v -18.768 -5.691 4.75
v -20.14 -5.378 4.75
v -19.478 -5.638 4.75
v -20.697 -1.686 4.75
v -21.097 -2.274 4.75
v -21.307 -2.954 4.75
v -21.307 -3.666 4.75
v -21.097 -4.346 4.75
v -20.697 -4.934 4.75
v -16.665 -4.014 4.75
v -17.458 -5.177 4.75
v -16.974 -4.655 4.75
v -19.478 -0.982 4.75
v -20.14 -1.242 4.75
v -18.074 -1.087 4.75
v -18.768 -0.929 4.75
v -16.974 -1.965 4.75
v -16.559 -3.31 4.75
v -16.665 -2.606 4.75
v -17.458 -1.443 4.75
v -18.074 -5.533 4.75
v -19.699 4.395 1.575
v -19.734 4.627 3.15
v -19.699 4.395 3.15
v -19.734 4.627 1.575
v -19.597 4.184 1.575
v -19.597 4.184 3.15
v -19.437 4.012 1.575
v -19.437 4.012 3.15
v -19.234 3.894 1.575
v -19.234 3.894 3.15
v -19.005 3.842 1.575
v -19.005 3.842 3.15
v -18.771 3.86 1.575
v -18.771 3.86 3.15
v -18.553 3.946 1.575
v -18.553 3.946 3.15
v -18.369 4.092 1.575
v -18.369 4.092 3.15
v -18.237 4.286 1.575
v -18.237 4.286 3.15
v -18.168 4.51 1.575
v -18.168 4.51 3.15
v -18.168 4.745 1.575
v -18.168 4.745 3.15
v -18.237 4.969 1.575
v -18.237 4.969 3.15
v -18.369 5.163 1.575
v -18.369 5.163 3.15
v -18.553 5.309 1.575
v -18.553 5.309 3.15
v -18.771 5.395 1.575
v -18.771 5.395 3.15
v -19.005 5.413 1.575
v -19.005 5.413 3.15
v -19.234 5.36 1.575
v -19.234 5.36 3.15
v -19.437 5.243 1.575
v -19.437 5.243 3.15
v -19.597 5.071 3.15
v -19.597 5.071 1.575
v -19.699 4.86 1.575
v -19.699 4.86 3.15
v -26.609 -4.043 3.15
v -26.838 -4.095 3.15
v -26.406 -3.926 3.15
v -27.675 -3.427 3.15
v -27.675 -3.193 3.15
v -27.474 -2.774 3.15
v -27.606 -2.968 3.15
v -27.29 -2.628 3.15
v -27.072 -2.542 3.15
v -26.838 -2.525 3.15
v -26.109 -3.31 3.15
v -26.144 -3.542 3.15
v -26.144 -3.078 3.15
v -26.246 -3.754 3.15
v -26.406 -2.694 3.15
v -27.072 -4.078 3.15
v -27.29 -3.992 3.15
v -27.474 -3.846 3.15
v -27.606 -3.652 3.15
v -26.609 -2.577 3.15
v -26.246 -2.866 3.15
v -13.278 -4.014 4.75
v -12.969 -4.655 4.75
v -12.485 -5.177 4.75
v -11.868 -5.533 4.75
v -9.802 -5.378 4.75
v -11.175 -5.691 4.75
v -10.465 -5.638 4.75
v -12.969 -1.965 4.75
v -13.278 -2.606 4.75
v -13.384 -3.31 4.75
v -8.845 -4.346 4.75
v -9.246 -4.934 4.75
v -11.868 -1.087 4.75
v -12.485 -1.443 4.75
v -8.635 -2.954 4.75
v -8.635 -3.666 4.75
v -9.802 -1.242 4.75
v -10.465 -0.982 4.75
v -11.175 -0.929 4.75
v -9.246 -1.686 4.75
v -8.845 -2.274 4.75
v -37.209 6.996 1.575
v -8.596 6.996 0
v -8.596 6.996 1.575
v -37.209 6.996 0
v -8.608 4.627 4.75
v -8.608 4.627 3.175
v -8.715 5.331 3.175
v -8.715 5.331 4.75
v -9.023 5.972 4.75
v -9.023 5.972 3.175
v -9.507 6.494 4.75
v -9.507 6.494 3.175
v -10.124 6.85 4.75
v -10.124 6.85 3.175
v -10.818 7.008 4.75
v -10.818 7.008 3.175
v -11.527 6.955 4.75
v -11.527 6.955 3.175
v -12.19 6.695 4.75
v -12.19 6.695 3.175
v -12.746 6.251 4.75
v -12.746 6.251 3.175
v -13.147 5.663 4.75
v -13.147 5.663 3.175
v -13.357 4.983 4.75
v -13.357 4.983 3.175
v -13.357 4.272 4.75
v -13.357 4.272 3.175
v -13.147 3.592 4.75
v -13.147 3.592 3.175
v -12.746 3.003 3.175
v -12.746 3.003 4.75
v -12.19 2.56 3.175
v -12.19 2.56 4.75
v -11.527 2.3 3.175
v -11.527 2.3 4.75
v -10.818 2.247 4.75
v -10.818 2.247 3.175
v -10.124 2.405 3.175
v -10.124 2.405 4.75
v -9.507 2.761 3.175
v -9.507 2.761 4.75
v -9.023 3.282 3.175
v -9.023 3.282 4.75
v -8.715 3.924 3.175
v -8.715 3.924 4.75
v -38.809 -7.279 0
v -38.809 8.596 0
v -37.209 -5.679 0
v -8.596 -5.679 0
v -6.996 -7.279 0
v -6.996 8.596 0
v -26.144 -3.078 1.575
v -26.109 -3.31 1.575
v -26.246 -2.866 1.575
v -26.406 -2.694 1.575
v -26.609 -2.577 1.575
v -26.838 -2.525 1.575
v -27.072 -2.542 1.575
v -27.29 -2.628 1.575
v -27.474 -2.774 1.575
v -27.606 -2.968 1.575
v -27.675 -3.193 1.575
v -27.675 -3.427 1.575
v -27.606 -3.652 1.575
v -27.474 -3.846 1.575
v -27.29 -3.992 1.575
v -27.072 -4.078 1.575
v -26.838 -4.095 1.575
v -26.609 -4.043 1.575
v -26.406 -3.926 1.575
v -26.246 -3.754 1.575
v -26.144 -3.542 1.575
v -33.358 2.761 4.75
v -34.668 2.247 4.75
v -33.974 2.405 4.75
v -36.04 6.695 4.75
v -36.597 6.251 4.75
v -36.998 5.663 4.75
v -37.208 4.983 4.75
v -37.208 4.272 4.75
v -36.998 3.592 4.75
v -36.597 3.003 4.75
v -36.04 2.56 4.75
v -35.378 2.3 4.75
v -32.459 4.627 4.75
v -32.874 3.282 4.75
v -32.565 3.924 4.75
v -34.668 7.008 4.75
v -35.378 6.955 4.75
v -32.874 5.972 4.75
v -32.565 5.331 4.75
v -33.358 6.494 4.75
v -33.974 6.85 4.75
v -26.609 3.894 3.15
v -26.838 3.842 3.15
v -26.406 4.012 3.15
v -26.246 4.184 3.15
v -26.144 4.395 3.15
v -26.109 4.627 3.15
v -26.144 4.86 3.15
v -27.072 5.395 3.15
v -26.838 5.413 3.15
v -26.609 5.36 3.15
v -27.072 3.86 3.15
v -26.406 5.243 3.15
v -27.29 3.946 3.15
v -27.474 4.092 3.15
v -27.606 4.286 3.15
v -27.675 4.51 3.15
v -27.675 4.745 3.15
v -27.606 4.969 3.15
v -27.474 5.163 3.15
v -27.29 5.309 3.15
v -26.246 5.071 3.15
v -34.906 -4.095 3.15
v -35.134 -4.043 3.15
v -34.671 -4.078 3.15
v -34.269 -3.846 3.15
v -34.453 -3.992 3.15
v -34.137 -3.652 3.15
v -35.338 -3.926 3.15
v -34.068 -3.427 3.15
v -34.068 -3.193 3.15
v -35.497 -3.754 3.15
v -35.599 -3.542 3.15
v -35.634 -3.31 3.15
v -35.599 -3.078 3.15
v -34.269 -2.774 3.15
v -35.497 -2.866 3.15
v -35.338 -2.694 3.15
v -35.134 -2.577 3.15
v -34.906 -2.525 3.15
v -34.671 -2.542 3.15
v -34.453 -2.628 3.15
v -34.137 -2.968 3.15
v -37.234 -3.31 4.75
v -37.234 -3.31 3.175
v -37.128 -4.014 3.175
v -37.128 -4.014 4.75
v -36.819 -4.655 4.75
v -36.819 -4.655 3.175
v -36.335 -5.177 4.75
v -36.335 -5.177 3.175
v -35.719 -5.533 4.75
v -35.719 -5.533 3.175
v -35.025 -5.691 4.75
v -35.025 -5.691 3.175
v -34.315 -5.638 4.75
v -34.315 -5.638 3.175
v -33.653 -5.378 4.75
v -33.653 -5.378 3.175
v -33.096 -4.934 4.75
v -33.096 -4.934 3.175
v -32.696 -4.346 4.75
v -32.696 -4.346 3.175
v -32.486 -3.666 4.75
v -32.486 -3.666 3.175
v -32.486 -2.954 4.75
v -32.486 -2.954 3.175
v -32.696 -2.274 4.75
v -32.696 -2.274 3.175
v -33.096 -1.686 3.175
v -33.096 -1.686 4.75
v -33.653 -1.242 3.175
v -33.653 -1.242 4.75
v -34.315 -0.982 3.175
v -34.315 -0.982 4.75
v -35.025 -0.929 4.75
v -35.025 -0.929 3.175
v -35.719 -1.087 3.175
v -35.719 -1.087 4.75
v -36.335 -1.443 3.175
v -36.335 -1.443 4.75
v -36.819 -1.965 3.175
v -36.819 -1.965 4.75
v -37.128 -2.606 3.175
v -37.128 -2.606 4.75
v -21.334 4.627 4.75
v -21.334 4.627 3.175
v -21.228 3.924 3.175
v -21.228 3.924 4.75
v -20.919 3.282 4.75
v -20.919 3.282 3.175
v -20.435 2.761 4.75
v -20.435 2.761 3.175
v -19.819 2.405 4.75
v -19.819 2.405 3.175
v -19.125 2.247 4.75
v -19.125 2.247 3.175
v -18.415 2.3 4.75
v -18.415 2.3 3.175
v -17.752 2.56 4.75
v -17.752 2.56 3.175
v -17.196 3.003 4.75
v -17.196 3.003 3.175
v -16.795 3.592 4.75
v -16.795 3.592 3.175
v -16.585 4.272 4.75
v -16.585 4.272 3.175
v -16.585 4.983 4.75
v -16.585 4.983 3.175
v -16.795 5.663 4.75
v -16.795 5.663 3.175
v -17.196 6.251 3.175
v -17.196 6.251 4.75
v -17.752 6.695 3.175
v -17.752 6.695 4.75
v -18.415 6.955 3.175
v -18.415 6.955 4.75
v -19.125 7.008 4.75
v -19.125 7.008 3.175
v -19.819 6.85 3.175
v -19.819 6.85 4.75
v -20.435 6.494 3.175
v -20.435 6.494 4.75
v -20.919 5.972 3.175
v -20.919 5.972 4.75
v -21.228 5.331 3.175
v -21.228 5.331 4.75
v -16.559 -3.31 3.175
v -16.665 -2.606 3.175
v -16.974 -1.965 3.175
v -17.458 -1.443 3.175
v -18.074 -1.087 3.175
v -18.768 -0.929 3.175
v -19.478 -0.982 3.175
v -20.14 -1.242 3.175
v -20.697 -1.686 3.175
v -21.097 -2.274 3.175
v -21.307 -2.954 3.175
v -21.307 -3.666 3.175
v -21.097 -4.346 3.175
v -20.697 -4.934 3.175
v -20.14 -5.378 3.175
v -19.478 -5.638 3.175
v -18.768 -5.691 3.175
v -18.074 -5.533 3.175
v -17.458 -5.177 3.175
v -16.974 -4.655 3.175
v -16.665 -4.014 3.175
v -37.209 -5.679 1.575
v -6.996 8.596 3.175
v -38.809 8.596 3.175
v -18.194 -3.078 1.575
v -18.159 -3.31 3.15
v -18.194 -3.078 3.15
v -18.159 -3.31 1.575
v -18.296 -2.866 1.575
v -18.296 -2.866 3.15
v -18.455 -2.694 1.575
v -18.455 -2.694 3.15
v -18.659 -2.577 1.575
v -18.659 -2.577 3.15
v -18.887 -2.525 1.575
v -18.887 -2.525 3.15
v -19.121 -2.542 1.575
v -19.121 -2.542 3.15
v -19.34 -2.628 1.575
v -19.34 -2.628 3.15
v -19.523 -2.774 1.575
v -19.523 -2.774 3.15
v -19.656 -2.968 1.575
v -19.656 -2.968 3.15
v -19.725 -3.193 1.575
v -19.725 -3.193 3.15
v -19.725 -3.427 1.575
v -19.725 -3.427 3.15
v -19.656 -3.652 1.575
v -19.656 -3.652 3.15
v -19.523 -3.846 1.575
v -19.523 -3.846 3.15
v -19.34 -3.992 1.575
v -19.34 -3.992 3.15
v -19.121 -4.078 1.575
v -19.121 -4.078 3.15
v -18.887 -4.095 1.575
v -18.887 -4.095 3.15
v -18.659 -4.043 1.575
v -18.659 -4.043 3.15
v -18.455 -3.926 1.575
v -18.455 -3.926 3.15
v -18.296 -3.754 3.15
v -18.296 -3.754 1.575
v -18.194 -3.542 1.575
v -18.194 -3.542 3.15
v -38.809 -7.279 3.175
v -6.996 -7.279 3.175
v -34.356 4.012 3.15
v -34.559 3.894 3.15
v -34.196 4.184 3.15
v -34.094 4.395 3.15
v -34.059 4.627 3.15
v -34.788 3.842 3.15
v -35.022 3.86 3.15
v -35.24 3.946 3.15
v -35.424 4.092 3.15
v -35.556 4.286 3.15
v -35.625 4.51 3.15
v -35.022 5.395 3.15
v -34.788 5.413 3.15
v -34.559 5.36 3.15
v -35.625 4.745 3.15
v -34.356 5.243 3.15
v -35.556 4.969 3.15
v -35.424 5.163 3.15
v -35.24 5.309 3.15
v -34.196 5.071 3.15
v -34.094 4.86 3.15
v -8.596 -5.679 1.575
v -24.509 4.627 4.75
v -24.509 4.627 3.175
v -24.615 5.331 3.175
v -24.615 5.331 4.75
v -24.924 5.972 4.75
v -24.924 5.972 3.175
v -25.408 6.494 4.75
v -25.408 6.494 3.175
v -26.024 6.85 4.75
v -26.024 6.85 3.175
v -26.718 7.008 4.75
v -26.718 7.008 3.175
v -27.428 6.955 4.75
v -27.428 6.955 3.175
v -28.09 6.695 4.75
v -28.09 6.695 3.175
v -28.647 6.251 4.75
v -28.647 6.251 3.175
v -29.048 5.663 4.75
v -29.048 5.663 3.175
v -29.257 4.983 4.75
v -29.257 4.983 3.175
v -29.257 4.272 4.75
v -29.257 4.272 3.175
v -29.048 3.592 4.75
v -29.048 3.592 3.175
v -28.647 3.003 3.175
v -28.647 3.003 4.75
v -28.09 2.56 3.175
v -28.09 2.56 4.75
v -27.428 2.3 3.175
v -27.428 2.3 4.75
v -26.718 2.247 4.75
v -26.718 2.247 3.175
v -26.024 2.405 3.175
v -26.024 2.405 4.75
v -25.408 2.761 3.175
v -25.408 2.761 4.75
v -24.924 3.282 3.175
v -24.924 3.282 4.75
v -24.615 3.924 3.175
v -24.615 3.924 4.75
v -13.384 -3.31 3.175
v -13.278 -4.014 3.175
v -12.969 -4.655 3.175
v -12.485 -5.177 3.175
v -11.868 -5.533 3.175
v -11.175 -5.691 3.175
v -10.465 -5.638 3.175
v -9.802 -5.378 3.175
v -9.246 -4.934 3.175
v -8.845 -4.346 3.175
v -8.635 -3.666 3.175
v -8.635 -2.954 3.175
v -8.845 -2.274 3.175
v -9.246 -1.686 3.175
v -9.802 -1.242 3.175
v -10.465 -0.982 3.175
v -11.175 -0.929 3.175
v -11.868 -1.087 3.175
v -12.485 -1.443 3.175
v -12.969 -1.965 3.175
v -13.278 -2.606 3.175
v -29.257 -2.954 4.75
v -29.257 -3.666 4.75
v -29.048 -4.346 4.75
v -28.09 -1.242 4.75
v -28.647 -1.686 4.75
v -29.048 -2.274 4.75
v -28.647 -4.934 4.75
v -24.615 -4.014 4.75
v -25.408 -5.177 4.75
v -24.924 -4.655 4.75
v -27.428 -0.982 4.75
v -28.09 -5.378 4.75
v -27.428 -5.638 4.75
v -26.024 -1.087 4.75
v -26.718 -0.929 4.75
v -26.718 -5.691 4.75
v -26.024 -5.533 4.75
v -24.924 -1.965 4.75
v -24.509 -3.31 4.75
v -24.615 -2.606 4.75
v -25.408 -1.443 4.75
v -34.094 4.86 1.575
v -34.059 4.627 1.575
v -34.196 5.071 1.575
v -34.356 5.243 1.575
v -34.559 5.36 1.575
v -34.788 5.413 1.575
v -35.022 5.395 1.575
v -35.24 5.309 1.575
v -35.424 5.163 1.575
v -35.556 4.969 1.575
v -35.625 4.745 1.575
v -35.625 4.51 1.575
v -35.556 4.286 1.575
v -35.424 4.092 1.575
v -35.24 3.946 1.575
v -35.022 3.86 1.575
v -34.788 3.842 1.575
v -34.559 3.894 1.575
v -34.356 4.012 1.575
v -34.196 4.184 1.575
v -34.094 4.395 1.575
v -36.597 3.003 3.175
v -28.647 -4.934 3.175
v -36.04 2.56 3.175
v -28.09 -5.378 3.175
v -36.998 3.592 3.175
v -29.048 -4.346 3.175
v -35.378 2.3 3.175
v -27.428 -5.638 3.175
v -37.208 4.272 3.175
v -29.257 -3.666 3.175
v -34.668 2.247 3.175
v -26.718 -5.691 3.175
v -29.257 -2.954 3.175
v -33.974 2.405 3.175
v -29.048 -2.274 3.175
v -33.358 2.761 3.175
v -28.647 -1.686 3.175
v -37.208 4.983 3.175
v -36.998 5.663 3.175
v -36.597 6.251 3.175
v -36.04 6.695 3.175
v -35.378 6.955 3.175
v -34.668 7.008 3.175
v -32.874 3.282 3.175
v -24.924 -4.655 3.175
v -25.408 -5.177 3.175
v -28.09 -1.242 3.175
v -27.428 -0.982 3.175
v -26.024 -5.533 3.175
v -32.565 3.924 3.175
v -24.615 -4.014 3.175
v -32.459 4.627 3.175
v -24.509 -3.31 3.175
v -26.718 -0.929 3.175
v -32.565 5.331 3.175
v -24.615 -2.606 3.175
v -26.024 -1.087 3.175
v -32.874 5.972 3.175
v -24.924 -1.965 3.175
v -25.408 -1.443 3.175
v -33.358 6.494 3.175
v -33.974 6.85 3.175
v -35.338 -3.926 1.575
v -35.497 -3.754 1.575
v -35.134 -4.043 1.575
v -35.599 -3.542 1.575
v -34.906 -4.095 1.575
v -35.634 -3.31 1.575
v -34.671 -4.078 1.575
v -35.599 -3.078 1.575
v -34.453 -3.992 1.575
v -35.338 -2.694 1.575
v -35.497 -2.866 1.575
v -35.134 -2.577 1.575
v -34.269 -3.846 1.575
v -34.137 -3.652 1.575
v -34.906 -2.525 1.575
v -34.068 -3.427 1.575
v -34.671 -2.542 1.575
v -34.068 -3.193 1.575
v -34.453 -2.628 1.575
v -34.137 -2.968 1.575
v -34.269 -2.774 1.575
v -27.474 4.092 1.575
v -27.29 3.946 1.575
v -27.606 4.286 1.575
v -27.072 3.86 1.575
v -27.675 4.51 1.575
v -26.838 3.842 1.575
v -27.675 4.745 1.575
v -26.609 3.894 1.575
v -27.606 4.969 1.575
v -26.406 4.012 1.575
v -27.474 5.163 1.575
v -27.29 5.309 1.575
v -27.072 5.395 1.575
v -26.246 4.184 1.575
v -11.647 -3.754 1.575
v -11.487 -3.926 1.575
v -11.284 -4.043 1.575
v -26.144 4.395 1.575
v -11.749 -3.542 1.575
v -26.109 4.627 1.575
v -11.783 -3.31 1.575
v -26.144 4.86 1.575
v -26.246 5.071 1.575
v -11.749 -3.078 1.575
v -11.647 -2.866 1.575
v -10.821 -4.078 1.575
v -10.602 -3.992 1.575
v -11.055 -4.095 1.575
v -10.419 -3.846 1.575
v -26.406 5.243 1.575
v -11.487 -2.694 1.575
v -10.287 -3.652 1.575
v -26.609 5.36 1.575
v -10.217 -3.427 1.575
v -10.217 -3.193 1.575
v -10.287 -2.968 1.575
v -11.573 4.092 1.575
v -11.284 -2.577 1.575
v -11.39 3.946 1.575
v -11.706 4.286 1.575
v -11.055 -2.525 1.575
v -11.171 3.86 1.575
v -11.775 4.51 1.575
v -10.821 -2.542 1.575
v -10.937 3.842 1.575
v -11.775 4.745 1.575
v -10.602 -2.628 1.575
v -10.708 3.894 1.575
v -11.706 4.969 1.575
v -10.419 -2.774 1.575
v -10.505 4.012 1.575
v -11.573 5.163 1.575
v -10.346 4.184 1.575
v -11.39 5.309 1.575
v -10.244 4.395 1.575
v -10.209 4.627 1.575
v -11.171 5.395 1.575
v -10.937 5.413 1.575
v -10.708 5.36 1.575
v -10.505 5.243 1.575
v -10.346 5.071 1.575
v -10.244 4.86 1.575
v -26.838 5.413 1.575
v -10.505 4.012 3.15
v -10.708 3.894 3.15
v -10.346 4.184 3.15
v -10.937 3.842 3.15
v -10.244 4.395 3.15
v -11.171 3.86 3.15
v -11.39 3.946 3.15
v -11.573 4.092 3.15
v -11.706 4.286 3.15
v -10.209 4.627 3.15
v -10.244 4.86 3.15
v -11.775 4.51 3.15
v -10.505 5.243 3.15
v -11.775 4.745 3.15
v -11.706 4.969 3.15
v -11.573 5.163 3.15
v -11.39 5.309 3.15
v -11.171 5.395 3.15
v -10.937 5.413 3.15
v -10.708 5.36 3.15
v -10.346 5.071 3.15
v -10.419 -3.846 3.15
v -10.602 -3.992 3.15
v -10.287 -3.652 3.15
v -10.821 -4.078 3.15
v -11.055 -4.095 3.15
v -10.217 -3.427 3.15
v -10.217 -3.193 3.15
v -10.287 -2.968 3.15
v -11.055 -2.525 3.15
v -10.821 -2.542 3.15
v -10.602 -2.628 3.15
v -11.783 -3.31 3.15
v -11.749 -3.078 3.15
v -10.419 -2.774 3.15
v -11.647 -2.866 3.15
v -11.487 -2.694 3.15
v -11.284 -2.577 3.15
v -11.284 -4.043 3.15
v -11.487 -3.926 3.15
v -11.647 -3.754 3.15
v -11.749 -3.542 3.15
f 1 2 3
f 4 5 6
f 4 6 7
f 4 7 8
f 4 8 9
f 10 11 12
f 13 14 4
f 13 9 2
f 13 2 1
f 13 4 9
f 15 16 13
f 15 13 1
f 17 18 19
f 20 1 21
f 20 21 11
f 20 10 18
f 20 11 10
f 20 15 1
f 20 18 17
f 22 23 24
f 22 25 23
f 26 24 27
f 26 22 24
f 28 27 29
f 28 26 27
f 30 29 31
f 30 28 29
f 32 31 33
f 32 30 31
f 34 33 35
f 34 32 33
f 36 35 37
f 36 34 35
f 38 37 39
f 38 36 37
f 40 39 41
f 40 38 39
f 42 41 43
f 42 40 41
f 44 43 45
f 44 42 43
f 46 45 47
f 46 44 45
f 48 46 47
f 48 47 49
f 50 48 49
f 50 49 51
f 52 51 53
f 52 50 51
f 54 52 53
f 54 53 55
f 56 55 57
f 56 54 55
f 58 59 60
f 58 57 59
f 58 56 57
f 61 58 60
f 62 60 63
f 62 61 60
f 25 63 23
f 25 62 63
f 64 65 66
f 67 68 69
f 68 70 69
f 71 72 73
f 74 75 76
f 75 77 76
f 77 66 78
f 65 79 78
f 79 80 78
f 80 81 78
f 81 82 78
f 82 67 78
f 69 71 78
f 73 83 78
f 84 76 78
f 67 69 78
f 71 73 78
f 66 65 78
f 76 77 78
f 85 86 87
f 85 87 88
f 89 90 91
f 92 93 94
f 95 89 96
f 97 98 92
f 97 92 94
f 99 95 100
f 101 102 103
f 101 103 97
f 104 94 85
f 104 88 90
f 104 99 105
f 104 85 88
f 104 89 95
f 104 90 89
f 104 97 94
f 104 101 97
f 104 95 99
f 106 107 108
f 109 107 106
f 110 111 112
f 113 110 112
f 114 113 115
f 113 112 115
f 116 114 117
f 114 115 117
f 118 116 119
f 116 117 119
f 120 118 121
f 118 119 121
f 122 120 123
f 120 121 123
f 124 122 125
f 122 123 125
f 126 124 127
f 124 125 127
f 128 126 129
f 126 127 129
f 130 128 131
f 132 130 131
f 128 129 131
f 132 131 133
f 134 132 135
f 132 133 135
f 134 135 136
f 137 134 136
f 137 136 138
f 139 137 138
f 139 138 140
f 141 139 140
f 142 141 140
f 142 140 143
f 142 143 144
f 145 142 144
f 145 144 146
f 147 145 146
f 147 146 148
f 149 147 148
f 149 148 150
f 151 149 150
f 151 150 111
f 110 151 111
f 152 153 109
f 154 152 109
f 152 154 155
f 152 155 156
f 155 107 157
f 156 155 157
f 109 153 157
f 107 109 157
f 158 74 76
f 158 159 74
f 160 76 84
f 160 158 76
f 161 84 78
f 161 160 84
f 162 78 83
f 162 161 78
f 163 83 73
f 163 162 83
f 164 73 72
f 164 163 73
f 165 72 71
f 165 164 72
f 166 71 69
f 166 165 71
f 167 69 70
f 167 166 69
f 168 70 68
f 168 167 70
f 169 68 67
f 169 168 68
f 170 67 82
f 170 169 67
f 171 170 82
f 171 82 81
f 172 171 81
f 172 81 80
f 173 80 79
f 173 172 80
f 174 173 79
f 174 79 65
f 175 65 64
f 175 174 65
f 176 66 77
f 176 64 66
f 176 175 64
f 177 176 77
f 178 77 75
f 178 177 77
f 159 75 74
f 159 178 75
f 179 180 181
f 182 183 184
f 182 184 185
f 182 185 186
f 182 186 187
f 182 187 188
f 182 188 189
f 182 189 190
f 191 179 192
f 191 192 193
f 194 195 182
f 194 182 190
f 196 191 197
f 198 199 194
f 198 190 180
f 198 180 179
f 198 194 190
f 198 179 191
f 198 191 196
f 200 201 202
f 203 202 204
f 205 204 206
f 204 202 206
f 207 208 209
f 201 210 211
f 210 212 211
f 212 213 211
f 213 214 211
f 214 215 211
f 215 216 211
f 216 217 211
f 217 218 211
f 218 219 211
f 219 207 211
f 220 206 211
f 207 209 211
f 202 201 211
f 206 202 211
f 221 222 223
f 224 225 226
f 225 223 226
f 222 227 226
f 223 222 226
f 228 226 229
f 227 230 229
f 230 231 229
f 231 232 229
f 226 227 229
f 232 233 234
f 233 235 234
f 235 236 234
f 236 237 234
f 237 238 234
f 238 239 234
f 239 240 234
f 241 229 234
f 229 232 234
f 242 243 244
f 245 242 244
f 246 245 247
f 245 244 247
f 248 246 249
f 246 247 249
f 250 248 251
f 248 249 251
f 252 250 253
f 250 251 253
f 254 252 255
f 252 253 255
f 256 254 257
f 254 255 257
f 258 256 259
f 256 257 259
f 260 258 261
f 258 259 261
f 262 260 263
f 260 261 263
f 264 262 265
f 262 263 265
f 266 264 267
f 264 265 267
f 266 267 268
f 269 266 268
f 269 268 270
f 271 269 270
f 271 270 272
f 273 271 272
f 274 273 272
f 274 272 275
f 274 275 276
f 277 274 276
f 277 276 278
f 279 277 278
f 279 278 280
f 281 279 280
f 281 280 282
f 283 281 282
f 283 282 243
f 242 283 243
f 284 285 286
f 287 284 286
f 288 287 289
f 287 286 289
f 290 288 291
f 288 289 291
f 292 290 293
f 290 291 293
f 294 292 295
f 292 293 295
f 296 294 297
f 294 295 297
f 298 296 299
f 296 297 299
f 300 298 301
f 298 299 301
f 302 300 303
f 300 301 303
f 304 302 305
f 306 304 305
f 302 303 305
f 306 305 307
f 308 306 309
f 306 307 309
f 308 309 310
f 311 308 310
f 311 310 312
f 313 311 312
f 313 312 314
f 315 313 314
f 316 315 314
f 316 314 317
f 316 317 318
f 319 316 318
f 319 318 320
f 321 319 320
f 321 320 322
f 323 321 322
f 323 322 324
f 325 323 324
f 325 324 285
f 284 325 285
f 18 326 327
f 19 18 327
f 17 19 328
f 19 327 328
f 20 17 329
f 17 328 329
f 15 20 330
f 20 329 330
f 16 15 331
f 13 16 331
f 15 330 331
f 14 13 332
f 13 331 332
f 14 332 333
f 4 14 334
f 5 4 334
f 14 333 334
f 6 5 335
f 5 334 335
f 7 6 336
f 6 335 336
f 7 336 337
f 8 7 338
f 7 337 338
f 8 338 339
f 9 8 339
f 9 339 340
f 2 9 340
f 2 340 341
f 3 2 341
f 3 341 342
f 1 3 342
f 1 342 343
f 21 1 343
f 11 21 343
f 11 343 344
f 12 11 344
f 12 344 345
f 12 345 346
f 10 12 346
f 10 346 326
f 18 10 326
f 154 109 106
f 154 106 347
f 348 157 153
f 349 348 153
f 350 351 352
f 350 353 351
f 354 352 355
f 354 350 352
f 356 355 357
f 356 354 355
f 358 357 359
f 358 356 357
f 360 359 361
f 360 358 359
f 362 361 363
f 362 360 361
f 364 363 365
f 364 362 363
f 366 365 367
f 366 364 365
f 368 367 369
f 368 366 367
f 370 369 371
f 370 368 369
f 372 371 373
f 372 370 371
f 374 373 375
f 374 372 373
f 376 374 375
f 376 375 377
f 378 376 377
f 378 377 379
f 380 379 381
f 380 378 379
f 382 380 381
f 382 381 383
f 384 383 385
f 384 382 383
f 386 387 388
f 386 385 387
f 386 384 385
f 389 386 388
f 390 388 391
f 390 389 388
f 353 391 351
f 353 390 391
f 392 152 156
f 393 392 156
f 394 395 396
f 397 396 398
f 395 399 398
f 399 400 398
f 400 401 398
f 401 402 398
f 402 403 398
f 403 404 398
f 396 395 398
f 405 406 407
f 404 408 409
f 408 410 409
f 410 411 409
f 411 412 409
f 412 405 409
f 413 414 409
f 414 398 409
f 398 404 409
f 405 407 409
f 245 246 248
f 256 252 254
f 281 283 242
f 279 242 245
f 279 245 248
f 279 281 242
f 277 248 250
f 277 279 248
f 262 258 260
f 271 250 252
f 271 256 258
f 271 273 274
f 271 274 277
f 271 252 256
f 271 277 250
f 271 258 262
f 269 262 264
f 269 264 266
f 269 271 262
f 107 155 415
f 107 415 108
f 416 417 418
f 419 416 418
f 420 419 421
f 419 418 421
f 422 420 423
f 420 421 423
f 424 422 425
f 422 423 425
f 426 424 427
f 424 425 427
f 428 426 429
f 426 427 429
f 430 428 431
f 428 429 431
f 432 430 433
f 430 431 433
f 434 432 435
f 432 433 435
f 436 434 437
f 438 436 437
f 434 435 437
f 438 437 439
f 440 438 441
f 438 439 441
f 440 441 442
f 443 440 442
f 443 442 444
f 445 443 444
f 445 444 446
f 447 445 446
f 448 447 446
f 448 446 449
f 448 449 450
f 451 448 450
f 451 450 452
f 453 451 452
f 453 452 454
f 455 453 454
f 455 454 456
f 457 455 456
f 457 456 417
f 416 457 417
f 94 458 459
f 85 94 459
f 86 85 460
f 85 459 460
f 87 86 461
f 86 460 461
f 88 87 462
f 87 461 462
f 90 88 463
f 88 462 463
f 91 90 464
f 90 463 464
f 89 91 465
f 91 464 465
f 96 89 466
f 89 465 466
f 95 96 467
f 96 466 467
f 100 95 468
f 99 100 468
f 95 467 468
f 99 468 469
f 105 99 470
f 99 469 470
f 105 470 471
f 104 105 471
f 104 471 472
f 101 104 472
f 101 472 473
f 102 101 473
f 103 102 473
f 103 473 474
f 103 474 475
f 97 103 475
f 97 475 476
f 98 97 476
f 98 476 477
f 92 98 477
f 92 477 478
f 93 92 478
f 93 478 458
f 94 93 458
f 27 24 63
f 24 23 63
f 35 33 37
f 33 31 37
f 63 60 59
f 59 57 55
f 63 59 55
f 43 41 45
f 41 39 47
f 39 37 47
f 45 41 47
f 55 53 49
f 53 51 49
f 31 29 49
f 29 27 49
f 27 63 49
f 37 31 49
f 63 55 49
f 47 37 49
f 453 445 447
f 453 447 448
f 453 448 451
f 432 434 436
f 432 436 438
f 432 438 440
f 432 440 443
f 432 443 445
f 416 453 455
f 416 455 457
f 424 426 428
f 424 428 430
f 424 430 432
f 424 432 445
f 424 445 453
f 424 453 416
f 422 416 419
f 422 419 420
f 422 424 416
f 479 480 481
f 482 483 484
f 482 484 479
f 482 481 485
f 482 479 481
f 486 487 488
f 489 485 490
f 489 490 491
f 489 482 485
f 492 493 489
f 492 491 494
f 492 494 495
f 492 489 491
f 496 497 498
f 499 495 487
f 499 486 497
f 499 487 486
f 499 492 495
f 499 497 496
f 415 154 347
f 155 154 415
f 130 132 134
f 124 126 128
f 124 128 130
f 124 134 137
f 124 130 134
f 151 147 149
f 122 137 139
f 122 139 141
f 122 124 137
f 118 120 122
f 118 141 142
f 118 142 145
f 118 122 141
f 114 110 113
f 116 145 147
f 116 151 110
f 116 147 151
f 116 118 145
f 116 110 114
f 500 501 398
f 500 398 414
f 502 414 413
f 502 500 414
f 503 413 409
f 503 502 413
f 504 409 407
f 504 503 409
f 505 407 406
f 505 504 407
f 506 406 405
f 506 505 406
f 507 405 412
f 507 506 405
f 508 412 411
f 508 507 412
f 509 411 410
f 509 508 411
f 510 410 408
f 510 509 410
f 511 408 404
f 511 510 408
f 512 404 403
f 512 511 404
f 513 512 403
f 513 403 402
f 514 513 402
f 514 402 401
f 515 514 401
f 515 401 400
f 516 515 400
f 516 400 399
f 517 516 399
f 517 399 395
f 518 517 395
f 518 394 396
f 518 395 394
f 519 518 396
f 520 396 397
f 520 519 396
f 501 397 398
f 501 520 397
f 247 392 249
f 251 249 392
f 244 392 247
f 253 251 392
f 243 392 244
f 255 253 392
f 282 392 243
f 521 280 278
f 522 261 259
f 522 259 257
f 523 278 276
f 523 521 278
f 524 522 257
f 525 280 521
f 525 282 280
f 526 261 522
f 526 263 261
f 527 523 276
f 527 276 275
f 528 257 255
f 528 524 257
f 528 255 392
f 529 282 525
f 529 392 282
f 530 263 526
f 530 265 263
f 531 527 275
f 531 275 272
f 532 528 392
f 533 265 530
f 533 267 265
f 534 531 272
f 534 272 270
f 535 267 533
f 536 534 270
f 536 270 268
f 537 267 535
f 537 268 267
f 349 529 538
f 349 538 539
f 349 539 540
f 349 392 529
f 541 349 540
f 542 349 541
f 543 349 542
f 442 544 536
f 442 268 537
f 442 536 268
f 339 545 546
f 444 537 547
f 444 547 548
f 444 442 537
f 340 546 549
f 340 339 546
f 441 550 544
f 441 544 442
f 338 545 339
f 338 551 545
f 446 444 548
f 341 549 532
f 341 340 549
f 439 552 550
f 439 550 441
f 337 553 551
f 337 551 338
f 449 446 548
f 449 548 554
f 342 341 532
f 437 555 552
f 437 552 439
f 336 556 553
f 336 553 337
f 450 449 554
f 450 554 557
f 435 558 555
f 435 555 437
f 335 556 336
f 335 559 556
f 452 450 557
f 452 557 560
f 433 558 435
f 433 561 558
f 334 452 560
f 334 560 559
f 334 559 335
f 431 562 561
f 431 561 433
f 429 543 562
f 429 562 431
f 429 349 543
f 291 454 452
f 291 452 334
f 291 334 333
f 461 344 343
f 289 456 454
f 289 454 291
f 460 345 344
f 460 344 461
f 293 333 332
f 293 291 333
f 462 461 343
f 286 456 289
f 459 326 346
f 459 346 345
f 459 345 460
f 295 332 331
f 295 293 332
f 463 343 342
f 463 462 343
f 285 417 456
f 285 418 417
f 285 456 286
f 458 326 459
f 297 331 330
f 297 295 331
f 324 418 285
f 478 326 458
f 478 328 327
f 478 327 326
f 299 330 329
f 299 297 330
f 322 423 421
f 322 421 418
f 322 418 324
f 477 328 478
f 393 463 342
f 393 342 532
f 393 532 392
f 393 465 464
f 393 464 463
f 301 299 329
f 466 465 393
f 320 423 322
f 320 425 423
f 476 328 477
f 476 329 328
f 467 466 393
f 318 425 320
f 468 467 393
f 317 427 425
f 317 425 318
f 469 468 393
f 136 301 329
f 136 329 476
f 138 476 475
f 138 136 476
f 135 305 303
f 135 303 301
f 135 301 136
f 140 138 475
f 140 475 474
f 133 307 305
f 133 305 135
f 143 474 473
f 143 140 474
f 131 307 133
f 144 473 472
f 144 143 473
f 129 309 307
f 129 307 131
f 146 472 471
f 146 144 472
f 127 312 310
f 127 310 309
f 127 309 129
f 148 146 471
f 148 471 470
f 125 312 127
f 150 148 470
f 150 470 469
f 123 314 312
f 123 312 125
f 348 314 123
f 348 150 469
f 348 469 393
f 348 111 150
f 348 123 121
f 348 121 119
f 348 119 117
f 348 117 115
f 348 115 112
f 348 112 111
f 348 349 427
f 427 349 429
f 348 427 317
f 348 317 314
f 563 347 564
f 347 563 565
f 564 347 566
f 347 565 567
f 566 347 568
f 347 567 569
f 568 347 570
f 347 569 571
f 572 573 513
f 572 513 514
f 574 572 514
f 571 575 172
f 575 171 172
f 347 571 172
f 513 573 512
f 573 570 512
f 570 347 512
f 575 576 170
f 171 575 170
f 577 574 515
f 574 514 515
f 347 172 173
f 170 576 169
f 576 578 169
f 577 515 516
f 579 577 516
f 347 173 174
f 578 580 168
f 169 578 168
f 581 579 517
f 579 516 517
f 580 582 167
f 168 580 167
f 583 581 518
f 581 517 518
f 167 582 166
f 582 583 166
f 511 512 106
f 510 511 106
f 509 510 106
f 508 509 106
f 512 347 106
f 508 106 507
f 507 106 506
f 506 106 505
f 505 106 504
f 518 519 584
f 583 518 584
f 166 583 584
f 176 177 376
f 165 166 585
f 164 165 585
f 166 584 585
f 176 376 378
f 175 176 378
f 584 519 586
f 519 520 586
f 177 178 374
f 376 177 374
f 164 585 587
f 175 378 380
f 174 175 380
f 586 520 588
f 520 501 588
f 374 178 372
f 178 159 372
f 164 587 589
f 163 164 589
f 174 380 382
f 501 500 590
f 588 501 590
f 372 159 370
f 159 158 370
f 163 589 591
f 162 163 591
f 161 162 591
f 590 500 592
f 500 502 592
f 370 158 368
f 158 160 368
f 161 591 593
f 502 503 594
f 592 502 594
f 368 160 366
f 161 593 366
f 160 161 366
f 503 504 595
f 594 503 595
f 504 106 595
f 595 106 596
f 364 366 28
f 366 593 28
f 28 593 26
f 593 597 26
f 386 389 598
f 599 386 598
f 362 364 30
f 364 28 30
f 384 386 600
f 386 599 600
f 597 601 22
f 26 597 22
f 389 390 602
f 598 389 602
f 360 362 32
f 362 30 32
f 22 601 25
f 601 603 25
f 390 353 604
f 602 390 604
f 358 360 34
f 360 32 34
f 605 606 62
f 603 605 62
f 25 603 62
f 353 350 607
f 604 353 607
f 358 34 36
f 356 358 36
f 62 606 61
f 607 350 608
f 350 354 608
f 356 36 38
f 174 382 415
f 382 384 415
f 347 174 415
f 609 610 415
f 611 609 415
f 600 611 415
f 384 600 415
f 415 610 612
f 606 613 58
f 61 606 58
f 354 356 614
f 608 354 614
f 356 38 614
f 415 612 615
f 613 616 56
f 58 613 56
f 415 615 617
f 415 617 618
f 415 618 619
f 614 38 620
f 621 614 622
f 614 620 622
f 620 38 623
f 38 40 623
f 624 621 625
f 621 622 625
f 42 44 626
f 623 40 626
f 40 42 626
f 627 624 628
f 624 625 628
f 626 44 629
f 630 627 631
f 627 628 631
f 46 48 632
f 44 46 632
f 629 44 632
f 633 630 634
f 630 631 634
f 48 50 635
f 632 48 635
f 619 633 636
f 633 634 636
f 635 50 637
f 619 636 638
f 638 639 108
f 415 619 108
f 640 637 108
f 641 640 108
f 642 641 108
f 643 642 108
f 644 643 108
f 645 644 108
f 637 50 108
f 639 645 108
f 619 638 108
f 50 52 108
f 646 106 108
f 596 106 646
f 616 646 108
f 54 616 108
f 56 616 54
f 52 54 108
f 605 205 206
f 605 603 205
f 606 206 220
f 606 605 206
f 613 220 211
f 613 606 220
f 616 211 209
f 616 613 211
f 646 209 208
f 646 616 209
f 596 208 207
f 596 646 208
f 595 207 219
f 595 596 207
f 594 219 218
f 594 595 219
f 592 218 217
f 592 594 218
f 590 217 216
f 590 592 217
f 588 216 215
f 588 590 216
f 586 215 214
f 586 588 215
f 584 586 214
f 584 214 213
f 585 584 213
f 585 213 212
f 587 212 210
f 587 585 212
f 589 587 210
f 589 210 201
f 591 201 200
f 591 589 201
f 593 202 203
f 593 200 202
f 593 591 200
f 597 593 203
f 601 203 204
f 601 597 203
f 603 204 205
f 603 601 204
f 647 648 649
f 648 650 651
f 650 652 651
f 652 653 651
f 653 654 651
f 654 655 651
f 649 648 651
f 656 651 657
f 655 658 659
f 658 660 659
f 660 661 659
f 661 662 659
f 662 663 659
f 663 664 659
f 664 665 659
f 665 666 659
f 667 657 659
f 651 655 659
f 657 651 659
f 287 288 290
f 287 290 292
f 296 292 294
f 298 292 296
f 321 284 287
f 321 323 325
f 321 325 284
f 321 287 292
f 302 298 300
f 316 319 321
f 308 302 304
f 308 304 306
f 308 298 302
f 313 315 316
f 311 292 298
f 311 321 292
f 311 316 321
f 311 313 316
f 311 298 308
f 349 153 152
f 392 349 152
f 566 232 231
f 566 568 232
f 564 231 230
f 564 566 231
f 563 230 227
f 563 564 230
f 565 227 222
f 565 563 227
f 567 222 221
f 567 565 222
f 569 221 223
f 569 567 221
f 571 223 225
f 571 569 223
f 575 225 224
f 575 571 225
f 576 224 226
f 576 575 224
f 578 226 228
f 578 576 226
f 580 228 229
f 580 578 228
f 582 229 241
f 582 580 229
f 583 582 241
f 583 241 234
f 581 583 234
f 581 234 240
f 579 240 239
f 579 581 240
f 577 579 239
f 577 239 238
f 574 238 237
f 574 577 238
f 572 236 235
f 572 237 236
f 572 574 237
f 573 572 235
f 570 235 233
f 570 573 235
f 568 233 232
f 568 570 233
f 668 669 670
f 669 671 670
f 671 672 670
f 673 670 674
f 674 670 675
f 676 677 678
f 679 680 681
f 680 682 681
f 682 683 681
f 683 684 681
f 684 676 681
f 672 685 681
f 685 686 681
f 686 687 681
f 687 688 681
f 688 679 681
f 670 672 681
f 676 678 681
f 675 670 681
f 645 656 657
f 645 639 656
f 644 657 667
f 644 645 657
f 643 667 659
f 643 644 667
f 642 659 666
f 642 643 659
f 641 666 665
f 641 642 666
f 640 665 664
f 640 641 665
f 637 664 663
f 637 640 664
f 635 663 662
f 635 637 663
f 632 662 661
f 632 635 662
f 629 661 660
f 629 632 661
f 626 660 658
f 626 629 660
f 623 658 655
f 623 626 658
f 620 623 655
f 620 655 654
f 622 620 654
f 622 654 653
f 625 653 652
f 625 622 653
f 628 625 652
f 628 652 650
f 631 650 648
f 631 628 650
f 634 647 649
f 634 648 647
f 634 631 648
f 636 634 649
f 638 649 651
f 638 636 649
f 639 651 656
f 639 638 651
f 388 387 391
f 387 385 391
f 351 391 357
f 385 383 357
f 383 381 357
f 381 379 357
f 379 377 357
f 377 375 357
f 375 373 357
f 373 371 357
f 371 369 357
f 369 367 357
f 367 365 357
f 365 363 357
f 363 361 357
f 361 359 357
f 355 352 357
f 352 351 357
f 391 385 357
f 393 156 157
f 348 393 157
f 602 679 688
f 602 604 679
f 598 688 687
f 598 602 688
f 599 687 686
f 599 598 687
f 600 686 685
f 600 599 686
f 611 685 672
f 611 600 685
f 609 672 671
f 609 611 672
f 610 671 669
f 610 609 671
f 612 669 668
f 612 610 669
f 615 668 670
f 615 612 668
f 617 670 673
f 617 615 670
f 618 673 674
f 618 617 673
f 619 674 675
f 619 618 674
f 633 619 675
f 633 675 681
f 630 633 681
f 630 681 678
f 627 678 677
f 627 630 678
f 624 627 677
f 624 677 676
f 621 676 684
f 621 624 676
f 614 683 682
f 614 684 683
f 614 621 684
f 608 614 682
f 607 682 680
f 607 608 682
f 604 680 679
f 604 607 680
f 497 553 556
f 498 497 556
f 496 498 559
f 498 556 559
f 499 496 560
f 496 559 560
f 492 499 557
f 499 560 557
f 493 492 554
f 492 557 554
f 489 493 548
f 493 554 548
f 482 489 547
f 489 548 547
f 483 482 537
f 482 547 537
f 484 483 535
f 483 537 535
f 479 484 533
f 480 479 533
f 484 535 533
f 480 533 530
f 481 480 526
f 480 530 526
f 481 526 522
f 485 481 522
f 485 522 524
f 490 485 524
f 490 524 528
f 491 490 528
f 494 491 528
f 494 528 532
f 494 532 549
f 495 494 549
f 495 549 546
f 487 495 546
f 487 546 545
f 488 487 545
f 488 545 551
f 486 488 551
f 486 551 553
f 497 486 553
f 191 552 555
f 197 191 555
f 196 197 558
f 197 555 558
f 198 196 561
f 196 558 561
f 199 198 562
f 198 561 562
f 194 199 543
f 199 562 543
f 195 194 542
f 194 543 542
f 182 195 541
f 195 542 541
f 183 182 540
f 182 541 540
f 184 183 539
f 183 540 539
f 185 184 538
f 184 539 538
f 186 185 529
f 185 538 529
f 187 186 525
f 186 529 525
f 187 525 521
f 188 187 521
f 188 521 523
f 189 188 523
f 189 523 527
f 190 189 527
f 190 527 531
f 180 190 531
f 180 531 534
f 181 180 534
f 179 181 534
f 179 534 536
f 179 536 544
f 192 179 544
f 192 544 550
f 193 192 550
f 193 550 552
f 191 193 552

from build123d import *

# Parameters (mm, degrees)
F1_DEPTH = 3.175
F2_DEPTH = 4.7498
F3_T     = -1.6002


with BuildPart() as f1:
    # F0 (on Top) → F1 (new body)
    with BuildSketch(Plane.XY):
        with BuildLine():
            Line((-6.9955831819, 8.5962191019), (-38.8090831819, 8.5962191019))
            Line((-38.8090831819, 8.5962191019), (-38.8090831819, 4.6274691019))
            Line((-38.8090831819, 4.6274691019), (-37.2342831819, 4.6274691019))
            ThreePointArc((-37.2342831819, 4.6274691019), (-34.8466831819, 7.0150691019), (-32.4590831819, 4.6274691019))
            Line((-32.4590831819, 4.6274691019), (-29.2840831819, 4.6274691019))
            ThreePointArc((-29.2840831819, 4.6274691019), (-26.8964831819, 7.0150691019), (-24.5088831819, 4.6274691019))
            Line((-24.5088831819, 4.6274691019), (-21.3338831819, 4.6274691019))
            ThreePointArc((-21.3338831819, 4.6274691019), (-18.9462831819, 7.0150691019), (-16.5586831819, 4.6274691019))
            Line((-16.5586831819, 4.6274691019), (-13.3836831819, 4.6274691019))
            ThreePointArc((-13.3836831819, 4.6274691019), (-10.9960831819, 7.0150691019), (-8.6084831819, 4.6274691019))
            Line((-8.6084831819, 4.6274691019), (-6.9955831819, 4.6274691019))
            Line((-6.9955831819, 4.6274691019), (-6.9955831819, 8.5962191019))
        make_face()
        with BuildLine():
            Line((-37.2342831819, 4.6274691019), (-38.8090831819, 4.6274691019))
            Line((-38.8090831819, 4.6274691019), (-38.8090831819, 0.6587191019))
            Line((-38.8090831819, 0.6587191019), (-6.9955831819, 0.6587191019))
            Line((-6.9955831819, 0.6587191019), (-6.9955831819, 4.6274691019))
            Line((-6.9955831819, 4.6274691019), (-8.6084831819, 4.6274691019))
            ThreePointArc((-8.6084831819, 4.6274691019), (-10.9960831819, 2.2398691019), (-13.3836831819, 4.6274691019))
            Line((-13.3836831819, 4.6274691019), (-16.5586831819, 4.6274691019))
            ThreePointArc((-16.5586831819, 4.6274691019), (-18.9462831819, 2.2398691019), (-21.3338831819, 4.6274691019))
            Line((-21.3338831819, 4.6274691019), (-24.5088831819, 4.6274691019))
            ThreePointArc((-24.5088831819, 4.6274691019), (-26.8964831819, 2.2398691019), (-29.2840831819, 4.6274691019))
            Line((-29.2840831819, 4.6274691019), (-32.4590831819, 4.6274691019))
            ThreePointArc((-32.4590831819, 4.6274691019), (-34.8466831819, 2.2398691019), (-37.2342831819, 4.6274691019))
        make_face()
        with BuildLine():
            Line((-37.2342831819, -3.3100308981), (-38.8090831819, -3.3100308981))
            Line((-38.8090831819, -3.3100308981), (-38.8090831819, -7.2787808981))
            Line((-38.8090831819, -7.2787808981), (-6.9955831819, -7.2787808981))
            Line((-6.9955831819, -7.2787808981), (-6.9955831819, -3.3100308981))
            Line((-6.9955831819, -3.3100308981), (-8.6084831819, -3.3100308981))
            ThreePointArc((-8.6084831819, -3.3100308981), (-10.9960831819, -5.6976308981), (-13.3836831819, -3.3100308981))
            Line((-13.3836831819, -3.3100308981), (-16.5586831819, -3.3100308981))
            ThreePointArc((-16.5586831819, -3.3100308981), (-18.9462831819, -5.6976308981), (-21.3338831819, -3.3100308981))
            Line((-21.3338831819, -3.3100308981), (-24.5088831819, -3.3100308981))
            ThreePointArc((-24.5088831819, -3.3100308981), (-26.8964831819, -5.6976308981), (-29.2840831819, -3.3100308981))
            Line((-29.2840831819, -3.3100308981), (-32.4590831819, -3.3100308981))
            ThreePointArc((-32.4590831819, -3.3100308981), (-34.8466831819, -5.6976308981), (-37.2342831819, -3.3100308981))
        make_face()
        with BuildLine():
            Line((-6.9955831819, 0.6587191019), (-38.8090831819, 0.6587191019))
            Line((-38.8090831819, 0.6587191019), (-38.8090831819, -3.3100308981))
            Line((-38.8090831819, -3.3100308981), (-37.2342831819, -3.3100308981))
            ThreePointArc((-37.2342831819, -3.3100308981), (-34.8466831819, -0.9224308981), (-32.4590831819, -3.3100308981))
            Line((-32.4590831819, -3.3100308981), (-29.2840831819, -3.3100308981))
            ThreePointArc((-29.2840831819, -3.3100308981), (-26.8964831819, -0.9224308981), (-24.5088831819, -3.3100308981))
            Line((-24.5088831819, -3.3100308981), (-21.3338831819, -3.3100308981))
            ThreePointArc((-21.3338831819, -3.3100308981), (-18.9462831819, -0.9224308981), (-16.5586831819, -3.3100308981))
            Line((-16.5586831819, -3.3100308981), (-13.3836831819, -3.3100308981))
            ThreePointArc((-13.3836831819, -3.3100308981), (-10.9960831819, -0.9224308981), (-8.6084831819, -3.3100308981))
            Line((-8.6084831819, -3.3100308981), (-6.9955831819, -3.3100308981))
            Line((-6.9955831819, -3.3100308981), (-6.9955831819, 0.6587191019))
        make_face()
    extrude(amount=F1_DEPTH)

    # F0 (on Top) → F2 (join)
    with BuildSketch(Plane.XY):
        with BuildLine():
            Line((-32.4590831819, 4.6274691019), (-37.2342831819, 4.6274691019))
            ThreePointArc((-37.2342831819, 4.6274691019), (-34.8466831819, 2.2398691019), (-32.4590831819, 4.6274691019))
        make_face()
        with BuildLine():
            ThreePointArc((-32.4590831819, 4.6274691019), (-34.8466831819, 7.0150691019), (-37.2342831819, 4.6274691019))
            Line((-37.2342831819, 4.6274691019), (-32.4590831819, 4.6274691019))
        make_face()
        with BuildLine():
            ThreePointArc((-32.4590831819, -3.3100308981), (-34.8466831819, -0.9224308981), (-37.2342831819, -3.3100308981))
            Line((-37.2342831819, -3.3100308981), (-32.4590831819, -3.3100308981))
        make_face()
        with BuildLine():
            Line((-32.4590831819, -3.3100308981), (-37.2342831819, -3.3100308981))
            ThreePointArc((-37.2342831819, -3.3100308981), (-34.8466831819, -5.6976308981), (-32.4590831819, -3.3100308981))
        make_face()
        with BuildLine():
            Line((-24.5088831819, -3.3100308981), (-29.2840831819, -3.3100308981))
            ThreePointArc((-29.2840831819, -3.3100308981), (-26.8964831819, -5.6976308981), (-24.5088831819, -3.3100308981))
        make_face()
        with BuildLine():
            ThreePointArc((-24.5088831819, -3.3100308981), (-26.8964831819, -0.9224308981), (-29.2840831819, -3.3100308981))
            Line((-29.2840831819, -3.3100308981), (-24.5088831819, -3.3100308981))
        make_face()
        with BuildLine():
            Line((-24.5088831819, 4.6274691019), (-29.2840831819, 4.6274691019))
            ThreePointArc((-29.2840831819, 4.6274691019), (-26.8964831819, 2.2398691019), (-24.5088831819, 4.6274691019))
        make_face()
        with BuildLine():
            ThreePointArc((-24.5088831819, 4.6274691019), (-26.8964831819, 7.0150691019), (-29.2840831819, 4.6274691019))
            Line((-29.2840831819, 4.6274691019), (-24.5088831819, 4.6274691019))
        make_face()
        with BuildLine():
            ThreePointArc((-21.3338831819, -3.3100308981), (-18.9462831819, -5.6976308981), (-16.5586831819, -3.3100308981))
            Line((-16.5586831819, -3.3100308981), (-21.3338831819, -3.3100308981))
        make_face()
        with BuildLine():
            Line((-21.3338831819, -3.3100308981), (-16.5586831819, -3.3100308981))
            ThreePointArc((-16.5586831819, -3.3100308981), (-18.9462831819, -0.9224308981), (-21.3338831819, -3.3100308981))
        make_face()
        with BuildLine():
            Line((-21.3338831819, 4.6274691019), (-16.5586831819, 4.6274691019))
            ThreePointArc((-16.5586831819, 4.6274691019), (-18.9462831819, 7.0150691019), (-21.3338831819, 4.6274691019))
        make_face()
        with BuildLine():
            ThreePointArc((-21.3338831819, 4.6274691019), (-18.9462831819, 2.2398691019), (-16.5586831819, 4.6274691019))
            Line((-16.5586831819, 4.6274691019), (-21.3338831819, 4.6274691019))
        make_face()
        with BuildLine():
            Line((-13.3836831819, -3.3100308981), (-8.6084831819, -3.3100308981))
            ThreePointArc((-8.6084831819, -3.3100308981), (-10.9960831819, -0.9224308981), (-13.3836831819, -3.3100308981))
        make_face()
        with BuildLine():
            ThreePointArc((-13.3836831819, -3.3100308981), (-10.9960831819, -5.6976308981), (-8.6084831819, -3.3100308981))
            Line((-8.6084831819, -3.3100308981), (-13.3836831819, -3.3100308981))
        make_face()
        with BuildLine():
            ThreePointArc((-13.3836831819, 4.6274691019), (-10.9960831819, 2.2398691019), (-8.6084831819, 4.6274691019))
            Line((-8.6084831819, 4.6274691019), (-13.3836831819, 4.6274691019))
        make_face()
        with BuildLine():
            Line((-13.3836831819, 4.6274691019), (-8.6084831819, 4.6274691019))
            ThreePointArc((-8.6084831819, 4.6274691019), (-10.9960831819, 7.0150691019), (-13.3836831819, 4.6274691019))
        make_face()
    extrude(amount=F2_DEPTH)

    # F3
    f3_openings = [f1.faces().sort_by_distance(p)[0] for p in [
        (-22.902333, 0.658719, 0),
    ]]
    offset(amount=F3_T, openings=f3_openings, kind=Kind.INTERSECTION)


solid = f1.part
